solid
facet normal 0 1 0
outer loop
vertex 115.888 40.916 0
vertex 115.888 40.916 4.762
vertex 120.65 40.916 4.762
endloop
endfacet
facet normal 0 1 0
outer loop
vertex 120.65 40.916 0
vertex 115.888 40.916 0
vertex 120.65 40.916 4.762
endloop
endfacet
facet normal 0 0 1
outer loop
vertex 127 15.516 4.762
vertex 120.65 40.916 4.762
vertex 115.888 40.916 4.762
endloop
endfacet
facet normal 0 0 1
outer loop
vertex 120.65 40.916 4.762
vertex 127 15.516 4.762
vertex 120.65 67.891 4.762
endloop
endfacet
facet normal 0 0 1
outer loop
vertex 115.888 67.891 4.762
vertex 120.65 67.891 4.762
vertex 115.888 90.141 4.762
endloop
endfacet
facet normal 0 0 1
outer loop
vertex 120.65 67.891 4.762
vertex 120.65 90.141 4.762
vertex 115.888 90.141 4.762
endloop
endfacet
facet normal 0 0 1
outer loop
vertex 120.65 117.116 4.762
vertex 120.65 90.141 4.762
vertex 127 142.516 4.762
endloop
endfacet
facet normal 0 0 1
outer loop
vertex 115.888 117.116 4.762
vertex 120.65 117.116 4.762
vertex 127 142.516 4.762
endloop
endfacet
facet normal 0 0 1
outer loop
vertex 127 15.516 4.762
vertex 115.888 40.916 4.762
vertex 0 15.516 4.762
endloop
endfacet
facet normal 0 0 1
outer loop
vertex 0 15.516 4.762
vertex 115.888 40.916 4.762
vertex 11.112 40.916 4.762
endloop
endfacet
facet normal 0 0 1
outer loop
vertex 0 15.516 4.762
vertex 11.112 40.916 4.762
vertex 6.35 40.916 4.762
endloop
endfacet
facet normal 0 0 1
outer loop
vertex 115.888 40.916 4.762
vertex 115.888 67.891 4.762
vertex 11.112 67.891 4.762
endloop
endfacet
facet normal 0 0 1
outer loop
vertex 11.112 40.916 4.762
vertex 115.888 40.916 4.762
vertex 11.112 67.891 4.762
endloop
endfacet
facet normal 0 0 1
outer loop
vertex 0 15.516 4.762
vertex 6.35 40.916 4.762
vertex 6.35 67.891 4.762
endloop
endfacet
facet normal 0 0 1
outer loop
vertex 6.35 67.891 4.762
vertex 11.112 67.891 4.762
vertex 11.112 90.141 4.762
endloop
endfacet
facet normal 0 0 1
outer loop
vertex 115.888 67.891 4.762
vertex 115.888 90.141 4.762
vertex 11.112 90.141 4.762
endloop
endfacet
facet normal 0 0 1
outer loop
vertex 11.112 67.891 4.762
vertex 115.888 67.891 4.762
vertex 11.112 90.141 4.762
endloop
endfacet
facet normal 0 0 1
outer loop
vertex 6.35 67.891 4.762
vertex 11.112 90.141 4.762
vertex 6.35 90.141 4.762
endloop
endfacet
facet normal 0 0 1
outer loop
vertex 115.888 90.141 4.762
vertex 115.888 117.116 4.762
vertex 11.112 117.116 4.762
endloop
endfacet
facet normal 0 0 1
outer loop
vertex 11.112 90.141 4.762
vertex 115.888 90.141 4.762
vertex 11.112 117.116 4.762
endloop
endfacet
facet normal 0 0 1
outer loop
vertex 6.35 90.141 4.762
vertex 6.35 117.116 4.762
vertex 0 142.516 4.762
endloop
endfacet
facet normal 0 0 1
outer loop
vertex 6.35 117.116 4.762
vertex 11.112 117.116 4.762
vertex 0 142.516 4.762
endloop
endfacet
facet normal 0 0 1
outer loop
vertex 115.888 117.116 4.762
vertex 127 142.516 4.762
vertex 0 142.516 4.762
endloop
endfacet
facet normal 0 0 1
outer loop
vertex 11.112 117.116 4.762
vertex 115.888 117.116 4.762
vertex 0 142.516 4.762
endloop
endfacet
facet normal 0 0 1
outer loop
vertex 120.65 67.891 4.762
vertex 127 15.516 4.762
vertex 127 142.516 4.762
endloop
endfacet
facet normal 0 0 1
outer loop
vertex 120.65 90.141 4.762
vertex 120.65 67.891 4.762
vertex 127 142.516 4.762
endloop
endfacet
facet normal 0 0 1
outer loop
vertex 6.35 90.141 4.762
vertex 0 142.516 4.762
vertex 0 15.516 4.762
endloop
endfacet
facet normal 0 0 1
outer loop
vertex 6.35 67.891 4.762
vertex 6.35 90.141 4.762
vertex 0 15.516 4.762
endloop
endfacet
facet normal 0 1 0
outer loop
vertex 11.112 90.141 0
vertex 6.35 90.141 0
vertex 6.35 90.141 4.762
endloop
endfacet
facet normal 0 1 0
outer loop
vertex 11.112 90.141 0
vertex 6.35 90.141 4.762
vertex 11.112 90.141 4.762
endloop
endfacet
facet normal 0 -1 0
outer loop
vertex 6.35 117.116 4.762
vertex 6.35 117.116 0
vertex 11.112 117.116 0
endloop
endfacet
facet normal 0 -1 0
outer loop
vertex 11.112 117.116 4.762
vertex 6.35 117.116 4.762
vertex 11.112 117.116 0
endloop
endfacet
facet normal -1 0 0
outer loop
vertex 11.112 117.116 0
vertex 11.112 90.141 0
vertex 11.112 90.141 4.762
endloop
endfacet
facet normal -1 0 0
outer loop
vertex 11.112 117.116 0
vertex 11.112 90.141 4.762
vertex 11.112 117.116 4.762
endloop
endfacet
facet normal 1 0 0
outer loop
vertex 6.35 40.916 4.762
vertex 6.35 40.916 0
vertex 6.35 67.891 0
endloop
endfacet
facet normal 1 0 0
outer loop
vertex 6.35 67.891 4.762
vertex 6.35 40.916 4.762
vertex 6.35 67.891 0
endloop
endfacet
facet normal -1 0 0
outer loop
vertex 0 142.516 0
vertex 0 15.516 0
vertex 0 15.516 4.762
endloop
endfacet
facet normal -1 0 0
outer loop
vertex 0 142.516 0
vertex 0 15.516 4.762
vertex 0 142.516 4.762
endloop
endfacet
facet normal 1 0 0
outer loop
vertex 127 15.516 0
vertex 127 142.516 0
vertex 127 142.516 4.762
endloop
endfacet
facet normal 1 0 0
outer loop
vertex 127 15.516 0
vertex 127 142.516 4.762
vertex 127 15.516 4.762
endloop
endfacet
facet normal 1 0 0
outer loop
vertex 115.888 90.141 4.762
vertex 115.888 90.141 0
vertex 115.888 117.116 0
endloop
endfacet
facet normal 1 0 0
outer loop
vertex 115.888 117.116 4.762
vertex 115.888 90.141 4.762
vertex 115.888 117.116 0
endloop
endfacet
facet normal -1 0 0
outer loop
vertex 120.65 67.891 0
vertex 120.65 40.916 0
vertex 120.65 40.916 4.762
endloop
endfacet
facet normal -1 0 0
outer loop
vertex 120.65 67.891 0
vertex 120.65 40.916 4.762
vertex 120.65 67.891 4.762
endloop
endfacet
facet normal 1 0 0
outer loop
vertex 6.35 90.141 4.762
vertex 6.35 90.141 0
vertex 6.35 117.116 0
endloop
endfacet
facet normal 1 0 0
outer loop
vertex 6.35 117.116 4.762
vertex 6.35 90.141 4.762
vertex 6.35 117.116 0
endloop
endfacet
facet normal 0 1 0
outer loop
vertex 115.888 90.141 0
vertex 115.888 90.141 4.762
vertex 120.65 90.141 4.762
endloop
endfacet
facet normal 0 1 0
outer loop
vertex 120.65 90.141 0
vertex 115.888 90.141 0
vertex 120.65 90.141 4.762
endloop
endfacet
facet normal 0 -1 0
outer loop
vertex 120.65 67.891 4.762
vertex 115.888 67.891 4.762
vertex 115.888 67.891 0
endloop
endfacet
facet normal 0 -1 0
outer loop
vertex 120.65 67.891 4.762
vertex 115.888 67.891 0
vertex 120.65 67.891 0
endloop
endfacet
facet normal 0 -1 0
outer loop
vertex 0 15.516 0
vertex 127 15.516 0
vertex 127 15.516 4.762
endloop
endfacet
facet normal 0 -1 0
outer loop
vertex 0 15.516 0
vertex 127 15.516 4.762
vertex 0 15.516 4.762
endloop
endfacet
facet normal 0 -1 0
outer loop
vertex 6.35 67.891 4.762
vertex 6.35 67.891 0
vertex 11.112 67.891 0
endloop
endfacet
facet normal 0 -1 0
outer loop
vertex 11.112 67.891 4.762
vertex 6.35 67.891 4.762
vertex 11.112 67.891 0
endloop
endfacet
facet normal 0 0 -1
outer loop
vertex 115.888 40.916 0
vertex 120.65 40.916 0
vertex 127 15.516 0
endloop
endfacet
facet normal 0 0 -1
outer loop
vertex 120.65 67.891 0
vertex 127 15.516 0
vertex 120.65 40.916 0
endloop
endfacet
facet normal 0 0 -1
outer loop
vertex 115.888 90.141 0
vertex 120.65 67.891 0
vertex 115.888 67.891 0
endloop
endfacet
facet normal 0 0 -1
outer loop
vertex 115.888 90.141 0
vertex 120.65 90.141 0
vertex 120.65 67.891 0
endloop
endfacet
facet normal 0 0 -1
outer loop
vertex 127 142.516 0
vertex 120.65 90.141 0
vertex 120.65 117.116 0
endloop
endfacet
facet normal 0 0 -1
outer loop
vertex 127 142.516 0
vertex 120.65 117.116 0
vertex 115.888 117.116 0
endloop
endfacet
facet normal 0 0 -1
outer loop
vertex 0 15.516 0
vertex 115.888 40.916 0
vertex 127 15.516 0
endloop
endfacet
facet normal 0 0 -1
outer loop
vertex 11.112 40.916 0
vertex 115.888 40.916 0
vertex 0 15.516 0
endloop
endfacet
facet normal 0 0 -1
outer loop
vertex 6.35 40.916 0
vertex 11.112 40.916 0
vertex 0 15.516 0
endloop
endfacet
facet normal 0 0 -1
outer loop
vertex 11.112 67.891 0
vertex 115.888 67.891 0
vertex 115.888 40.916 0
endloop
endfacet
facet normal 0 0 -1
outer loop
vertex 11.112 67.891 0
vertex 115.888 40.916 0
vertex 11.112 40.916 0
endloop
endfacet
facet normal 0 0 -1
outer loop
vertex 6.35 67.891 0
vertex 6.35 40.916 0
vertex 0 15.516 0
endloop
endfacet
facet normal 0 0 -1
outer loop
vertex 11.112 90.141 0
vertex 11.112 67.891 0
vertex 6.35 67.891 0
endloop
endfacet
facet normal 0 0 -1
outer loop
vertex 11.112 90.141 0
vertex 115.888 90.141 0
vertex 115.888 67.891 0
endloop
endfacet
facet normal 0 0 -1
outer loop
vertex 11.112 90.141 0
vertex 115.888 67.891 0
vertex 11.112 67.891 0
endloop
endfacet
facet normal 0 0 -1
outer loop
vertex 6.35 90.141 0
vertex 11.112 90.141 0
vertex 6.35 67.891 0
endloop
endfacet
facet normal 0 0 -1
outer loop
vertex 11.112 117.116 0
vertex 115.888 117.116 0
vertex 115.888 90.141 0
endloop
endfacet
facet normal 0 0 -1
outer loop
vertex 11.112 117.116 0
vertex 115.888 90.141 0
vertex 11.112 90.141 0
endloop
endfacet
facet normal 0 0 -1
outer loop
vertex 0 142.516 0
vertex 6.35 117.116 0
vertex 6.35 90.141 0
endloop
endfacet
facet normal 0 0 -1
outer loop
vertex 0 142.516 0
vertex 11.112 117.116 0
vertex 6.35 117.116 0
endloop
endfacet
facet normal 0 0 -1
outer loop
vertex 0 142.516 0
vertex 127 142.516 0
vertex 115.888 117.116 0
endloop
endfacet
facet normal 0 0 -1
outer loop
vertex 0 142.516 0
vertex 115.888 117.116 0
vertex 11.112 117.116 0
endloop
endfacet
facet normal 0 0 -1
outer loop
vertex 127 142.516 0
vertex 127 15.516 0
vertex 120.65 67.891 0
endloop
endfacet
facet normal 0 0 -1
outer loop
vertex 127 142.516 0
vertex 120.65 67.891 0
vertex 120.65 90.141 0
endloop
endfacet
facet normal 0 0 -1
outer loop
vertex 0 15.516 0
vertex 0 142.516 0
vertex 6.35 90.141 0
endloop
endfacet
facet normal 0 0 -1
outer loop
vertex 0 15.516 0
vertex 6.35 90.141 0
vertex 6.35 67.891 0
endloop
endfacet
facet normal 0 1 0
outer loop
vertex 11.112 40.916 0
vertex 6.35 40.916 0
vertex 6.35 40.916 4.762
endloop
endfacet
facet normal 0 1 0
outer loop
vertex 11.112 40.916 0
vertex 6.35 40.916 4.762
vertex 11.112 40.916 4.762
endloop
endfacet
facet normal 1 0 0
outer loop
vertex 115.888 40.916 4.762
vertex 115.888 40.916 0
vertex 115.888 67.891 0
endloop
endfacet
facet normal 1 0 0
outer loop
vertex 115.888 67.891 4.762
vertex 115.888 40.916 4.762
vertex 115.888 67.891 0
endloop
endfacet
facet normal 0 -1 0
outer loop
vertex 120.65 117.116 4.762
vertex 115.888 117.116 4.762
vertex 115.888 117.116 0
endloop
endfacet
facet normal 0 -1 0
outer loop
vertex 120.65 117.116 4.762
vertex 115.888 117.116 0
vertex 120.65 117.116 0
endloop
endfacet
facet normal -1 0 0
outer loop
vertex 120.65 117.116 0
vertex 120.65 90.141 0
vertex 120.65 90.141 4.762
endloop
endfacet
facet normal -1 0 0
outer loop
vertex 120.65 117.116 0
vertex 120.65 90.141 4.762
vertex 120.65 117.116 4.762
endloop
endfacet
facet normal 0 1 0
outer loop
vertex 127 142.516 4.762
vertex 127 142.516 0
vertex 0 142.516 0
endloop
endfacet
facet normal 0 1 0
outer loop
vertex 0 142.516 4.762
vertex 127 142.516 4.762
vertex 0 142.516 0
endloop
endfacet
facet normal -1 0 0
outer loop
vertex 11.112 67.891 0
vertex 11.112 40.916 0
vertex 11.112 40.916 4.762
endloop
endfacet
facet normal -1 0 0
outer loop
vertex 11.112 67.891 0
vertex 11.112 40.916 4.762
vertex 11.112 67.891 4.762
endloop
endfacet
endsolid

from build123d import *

# Parameters (mm, degrees)
SKETCH1_W           = 4.7625
SKETCH1_H           = 26.974800888
SKETCH1_H_2         = 26.974800889
BOSS_EXTRUDE1_DEPTH = 4.7625


with BuildPart() as part:
    # Sketch1 → Boss-Extrude1 (new body)
    with BuildSketch(Plane.XY):
        Polygon((65.88125, 142.515737536), (127, 142.515737536), (127, 15.515737536), (0, 15.515737536), (0, 142.515737536), (61.11875, 142.515737536), align=None)
        with Locations((8.73125, 103.628337092)):
            Rectangle(SKETCH1_W, SKETCH1_H, mode=Mode.SUBTRACT)
        with Locations((118.26875, 103.628337092)):
            Rectangle(SKETCH1_W, SKETCH1_H, mode=Mode.SUBTRACT)
        with Locations((118.26875, 54.403137981)):
            Rectangle(SKETCH1_W, SKETCH1_H_2, mode=Mode.SUBTRACT)
        with Locations((8.73125, 54.403137981)):
            Rectangle(SKETCH1_W, SKETCH1_H_2, mode=Mode.SUBTRACT)
    extrude(amount=BOSS_EXTRUDE1_DEPTH)


solid = part.part
